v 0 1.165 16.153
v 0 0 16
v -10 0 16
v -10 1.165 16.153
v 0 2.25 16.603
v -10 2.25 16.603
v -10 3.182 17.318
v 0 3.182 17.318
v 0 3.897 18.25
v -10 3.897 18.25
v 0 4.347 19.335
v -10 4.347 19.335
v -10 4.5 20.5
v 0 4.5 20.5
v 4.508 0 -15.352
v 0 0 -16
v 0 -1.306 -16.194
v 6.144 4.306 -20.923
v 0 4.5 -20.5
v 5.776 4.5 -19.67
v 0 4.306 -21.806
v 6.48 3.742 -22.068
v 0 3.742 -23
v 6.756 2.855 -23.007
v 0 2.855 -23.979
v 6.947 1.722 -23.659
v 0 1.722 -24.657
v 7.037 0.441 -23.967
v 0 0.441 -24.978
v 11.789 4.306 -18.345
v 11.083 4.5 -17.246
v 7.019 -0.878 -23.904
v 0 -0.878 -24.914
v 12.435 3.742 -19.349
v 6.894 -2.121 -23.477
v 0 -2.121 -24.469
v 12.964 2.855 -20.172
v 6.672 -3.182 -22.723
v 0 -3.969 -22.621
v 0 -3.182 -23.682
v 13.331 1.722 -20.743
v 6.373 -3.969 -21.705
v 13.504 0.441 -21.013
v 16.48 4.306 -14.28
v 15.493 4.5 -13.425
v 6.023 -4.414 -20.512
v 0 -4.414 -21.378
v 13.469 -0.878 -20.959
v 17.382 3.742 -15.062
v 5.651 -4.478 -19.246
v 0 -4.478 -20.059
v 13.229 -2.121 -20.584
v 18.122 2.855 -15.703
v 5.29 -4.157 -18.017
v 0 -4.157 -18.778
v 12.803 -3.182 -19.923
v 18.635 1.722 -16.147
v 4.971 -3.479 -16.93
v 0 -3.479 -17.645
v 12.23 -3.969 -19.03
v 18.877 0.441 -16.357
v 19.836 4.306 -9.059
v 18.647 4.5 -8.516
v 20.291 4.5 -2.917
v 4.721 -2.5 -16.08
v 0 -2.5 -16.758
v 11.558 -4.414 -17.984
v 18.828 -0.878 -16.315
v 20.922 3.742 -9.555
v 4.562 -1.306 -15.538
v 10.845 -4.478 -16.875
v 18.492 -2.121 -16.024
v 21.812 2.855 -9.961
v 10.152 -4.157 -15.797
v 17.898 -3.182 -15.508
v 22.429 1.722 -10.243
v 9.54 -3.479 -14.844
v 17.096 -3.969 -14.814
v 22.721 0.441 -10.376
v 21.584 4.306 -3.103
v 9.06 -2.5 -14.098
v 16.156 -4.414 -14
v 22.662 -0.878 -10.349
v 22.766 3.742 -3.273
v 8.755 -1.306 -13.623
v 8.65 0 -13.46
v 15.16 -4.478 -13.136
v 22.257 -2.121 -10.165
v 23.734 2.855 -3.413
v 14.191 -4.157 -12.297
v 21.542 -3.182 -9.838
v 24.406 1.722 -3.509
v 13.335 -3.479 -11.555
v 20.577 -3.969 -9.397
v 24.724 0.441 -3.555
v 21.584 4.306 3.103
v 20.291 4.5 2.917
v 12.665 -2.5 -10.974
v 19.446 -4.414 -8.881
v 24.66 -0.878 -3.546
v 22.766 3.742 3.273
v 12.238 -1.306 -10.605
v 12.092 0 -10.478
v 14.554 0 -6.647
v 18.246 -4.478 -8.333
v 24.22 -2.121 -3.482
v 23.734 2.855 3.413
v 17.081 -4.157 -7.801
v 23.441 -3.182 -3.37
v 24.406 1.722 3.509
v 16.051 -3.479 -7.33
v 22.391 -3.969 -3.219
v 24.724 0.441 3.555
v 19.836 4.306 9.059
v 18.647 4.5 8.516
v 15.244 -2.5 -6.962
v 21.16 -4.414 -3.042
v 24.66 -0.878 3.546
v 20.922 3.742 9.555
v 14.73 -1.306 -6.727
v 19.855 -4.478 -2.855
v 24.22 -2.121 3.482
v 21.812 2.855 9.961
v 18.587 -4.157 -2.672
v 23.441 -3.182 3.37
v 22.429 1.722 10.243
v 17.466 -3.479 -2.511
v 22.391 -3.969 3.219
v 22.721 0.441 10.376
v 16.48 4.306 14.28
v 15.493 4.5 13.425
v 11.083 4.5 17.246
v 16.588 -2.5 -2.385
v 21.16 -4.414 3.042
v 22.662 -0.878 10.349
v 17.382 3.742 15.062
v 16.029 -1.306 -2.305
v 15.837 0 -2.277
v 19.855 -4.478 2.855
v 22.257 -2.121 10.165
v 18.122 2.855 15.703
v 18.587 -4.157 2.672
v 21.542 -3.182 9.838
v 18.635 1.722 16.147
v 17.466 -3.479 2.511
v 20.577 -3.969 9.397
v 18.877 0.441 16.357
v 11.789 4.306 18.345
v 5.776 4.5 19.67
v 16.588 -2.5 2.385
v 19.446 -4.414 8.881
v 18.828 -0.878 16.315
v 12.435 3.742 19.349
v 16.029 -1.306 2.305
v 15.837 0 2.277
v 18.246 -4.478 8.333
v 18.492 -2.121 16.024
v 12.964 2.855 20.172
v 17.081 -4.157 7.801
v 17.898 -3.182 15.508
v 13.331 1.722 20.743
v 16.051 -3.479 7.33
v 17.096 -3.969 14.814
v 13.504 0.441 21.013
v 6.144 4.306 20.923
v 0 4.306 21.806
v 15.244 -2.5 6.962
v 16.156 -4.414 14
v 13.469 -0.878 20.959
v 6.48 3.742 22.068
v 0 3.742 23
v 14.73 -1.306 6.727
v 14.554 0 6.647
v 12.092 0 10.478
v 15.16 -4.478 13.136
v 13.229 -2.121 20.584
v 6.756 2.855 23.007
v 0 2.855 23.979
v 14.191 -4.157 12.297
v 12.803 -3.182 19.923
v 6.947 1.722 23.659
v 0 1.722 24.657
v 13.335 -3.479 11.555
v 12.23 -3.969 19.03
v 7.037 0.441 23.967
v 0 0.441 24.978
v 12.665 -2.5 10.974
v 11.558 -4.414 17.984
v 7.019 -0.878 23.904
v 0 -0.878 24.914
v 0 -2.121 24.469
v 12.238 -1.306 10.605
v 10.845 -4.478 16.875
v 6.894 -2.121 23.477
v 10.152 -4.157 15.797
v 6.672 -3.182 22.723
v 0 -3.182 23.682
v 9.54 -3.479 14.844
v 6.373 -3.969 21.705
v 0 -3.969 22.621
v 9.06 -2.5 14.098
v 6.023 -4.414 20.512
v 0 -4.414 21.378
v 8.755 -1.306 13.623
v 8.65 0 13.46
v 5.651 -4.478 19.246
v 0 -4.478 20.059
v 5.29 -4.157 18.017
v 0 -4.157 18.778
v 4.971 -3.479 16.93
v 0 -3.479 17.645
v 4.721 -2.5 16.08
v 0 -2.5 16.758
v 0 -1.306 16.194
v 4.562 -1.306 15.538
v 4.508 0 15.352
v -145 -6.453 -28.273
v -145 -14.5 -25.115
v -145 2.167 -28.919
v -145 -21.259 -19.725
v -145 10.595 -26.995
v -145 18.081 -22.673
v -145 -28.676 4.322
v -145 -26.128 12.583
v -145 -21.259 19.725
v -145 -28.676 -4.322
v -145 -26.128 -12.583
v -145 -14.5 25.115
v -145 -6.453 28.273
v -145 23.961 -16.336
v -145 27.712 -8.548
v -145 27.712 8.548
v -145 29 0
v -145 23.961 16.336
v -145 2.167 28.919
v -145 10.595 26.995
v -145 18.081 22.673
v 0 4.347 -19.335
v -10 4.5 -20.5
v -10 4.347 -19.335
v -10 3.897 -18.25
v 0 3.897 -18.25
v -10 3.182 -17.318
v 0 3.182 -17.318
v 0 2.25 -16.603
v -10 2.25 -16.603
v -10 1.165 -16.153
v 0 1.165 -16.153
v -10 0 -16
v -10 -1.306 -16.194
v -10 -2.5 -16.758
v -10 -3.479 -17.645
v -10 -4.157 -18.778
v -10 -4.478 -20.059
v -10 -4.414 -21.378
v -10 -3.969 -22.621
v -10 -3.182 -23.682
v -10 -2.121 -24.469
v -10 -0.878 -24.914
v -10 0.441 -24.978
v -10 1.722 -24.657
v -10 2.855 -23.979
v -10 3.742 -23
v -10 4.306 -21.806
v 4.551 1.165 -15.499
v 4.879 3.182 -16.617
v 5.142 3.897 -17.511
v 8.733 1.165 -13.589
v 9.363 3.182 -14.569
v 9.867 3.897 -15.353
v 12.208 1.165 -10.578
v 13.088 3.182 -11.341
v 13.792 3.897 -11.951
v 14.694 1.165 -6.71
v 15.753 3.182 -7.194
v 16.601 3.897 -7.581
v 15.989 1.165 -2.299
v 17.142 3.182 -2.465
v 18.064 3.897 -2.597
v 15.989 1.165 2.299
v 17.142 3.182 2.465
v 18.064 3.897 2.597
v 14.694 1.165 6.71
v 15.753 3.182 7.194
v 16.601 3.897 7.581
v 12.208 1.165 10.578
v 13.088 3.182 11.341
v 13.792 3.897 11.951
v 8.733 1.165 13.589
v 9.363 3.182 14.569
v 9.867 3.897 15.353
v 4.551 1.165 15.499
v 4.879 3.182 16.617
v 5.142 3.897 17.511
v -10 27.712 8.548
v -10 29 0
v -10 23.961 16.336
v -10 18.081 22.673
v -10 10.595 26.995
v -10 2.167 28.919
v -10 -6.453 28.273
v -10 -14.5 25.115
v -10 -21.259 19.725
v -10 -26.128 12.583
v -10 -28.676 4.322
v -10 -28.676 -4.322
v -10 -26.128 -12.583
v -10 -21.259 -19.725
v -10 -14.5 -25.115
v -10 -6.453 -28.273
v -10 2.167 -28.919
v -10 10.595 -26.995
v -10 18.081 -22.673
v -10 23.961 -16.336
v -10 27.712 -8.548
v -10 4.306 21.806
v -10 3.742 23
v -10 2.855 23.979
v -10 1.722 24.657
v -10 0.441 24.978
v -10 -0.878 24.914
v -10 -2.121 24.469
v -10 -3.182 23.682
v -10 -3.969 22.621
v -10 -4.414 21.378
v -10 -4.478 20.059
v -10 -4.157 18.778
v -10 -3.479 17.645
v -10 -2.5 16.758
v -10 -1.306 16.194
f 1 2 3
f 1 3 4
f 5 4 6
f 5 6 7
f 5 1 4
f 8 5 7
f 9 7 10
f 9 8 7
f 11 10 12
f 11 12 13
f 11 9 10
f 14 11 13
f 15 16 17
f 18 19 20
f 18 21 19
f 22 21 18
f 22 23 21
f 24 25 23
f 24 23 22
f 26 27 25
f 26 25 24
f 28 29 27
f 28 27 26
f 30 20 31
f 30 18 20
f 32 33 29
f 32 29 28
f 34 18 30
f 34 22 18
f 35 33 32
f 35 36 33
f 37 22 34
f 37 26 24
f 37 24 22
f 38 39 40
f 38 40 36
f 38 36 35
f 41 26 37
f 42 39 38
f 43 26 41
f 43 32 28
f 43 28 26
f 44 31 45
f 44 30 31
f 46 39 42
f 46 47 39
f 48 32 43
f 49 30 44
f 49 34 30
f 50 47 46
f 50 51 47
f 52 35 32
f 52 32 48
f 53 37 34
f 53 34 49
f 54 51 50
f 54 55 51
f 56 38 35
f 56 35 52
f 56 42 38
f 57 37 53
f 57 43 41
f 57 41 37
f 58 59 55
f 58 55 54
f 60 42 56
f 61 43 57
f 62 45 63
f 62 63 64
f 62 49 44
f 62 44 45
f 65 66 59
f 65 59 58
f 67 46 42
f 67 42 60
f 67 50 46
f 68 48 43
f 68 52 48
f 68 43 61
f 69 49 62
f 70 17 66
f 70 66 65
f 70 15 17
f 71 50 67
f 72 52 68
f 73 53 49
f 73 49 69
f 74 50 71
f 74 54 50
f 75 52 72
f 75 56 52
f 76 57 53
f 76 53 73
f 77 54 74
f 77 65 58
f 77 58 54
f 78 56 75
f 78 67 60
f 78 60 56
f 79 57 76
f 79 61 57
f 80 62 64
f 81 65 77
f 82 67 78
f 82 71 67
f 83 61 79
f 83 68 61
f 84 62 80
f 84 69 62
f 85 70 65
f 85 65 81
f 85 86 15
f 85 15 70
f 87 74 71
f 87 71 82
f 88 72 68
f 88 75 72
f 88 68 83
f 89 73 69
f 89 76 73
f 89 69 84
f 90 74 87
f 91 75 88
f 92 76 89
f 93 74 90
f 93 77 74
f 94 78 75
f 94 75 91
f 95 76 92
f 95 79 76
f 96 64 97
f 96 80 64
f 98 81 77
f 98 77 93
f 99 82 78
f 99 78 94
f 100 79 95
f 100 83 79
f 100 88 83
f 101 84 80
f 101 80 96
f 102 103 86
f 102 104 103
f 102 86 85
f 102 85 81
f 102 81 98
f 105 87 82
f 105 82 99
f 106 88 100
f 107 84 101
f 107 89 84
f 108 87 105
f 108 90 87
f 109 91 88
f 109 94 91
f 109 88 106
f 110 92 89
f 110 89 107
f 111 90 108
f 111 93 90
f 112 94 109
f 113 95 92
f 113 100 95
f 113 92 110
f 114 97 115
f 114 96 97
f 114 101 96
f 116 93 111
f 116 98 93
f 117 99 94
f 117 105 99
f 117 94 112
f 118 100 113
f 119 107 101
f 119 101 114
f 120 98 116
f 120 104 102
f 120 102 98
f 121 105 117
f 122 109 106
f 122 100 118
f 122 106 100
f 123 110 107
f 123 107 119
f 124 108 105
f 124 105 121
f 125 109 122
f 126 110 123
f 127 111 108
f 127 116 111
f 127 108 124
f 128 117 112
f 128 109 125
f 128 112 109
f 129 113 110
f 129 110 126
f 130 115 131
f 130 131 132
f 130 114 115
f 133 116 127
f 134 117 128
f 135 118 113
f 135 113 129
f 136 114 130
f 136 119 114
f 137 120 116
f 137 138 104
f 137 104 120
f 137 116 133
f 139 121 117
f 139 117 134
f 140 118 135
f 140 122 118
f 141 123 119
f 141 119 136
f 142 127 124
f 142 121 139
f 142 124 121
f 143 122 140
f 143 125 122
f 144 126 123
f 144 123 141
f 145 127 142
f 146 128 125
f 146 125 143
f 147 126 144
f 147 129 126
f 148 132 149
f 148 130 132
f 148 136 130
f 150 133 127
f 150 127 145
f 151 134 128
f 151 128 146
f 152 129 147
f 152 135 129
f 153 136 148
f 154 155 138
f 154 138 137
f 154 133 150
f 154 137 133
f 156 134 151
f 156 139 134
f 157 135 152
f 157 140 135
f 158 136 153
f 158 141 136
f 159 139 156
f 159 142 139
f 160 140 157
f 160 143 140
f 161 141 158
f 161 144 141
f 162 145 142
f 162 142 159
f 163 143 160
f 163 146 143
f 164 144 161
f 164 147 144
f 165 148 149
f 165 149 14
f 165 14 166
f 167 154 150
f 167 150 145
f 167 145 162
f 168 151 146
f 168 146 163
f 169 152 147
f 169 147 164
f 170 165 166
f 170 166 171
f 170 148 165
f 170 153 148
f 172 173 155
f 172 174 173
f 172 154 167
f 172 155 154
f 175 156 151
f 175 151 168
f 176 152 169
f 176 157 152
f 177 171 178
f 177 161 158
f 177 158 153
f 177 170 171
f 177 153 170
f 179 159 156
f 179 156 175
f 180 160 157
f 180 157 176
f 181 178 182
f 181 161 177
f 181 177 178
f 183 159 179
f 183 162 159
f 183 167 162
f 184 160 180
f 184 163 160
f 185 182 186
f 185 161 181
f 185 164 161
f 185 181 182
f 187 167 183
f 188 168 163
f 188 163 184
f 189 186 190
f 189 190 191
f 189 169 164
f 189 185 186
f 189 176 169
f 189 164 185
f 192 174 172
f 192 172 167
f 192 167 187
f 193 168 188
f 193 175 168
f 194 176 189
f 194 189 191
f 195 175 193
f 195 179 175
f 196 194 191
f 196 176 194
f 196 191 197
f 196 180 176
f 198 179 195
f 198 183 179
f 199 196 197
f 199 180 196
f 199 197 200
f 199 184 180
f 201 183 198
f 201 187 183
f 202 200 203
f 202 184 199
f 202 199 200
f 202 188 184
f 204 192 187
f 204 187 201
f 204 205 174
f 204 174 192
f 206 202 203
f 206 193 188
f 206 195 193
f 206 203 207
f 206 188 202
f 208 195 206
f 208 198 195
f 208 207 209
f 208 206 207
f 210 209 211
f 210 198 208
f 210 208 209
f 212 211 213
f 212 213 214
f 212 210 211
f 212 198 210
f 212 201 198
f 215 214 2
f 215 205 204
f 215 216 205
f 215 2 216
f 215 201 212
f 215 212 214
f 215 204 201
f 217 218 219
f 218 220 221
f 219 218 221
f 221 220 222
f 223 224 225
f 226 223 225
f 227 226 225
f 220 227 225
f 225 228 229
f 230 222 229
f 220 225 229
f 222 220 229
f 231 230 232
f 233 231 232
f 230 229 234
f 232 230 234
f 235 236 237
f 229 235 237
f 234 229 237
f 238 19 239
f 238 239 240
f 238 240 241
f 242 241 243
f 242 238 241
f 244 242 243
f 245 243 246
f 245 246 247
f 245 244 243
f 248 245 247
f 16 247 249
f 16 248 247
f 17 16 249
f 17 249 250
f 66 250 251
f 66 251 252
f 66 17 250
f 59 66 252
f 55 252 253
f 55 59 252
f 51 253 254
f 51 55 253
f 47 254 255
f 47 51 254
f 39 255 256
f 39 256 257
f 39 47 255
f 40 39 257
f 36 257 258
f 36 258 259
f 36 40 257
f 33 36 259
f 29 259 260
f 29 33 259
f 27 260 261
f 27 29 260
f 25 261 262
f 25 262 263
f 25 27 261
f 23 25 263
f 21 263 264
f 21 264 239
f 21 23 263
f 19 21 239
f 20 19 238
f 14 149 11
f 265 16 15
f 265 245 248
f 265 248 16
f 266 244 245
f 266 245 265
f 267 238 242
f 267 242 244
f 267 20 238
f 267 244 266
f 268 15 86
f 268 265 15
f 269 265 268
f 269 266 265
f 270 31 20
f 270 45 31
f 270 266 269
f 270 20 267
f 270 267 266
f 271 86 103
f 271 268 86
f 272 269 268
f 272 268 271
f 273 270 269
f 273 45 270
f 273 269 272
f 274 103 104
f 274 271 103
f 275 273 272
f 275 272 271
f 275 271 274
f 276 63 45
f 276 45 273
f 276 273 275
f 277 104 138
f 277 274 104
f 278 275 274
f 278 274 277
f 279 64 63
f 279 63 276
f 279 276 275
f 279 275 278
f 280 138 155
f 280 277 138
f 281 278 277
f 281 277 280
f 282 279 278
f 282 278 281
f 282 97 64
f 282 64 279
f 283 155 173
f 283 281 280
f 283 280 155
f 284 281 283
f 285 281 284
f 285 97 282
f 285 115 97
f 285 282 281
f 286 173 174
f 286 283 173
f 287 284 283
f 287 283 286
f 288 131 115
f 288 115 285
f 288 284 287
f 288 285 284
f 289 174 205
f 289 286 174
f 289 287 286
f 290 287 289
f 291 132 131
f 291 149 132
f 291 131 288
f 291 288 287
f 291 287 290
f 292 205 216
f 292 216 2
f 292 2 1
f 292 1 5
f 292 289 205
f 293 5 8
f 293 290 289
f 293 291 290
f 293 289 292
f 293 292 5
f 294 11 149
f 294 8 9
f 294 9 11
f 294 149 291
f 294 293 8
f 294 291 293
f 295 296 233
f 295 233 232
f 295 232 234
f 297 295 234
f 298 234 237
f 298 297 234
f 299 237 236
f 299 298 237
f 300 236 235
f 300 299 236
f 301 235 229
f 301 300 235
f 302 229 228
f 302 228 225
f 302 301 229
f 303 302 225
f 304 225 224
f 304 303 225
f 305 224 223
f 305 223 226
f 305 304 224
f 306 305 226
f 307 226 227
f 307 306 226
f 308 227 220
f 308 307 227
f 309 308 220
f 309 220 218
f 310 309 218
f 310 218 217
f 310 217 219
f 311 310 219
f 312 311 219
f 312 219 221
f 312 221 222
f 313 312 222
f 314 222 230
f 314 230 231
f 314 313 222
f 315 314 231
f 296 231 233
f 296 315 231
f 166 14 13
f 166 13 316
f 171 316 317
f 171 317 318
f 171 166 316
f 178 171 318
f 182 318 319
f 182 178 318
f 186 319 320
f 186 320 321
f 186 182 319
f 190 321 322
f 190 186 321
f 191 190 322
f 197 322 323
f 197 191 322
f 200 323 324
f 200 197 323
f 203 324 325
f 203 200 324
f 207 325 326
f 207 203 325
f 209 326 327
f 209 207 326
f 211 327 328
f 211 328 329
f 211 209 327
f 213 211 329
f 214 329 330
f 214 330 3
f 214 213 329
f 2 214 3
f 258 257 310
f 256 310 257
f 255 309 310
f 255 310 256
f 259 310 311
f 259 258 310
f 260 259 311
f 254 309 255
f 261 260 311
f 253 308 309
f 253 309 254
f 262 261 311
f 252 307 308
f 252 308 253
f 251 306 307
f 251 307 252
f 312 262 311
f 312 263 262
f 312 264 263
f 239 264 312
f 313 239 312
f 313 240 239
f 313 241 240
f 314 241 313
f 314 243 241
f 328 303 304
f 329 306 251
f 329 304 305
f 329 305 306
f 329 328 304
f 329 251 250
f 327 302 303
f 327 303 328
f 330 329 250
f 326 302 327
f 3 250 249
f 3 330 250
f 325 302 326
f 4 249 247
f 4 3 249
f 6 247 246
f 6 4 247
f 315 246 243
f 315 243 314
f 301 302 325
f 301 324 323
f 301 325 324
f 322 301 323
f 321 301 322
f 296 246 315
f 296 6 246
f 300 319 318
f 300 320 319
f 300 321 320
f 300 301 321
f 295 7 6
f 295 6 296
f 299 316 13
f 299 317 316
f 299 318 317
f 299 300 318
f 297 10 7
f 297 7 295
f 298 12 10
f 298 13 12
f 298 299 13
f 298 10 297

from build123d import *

# Parameters (mm, degrees)
F0_R     = 29
F1_DEPTH = 135
F4_DEPTH = 10
F5_DEPTH = 10


with BuildPart() as f1:
    # F0 (on Right) → F1 (new body)
    with BuildSketch(Plane.YZ):
        Circle(F0_R)
    extrude(amount=-F1_DEPTH)

    # F2 (on Right) → F3 (revolve)
    with BuildSketch(Plane.YZ):
        with BuildLine():
            ThreePointArc((0, 16), (3.1819805153, 17.3180194847), (4.5, 20.5))
            ThreePointArc((4.5, 20.5), (-3.1819805153, 23.6819805153), (0, 16))
        make_face()
    revolve(axis=Axis((0, -100, 0), (0, -1, 0)))

    # F4 (add): a face of the model
    f4_faces = [f1.faces().sort_by_distance(p)[0] for p in [
        (-135, 0, 0),
    ]]
    extrude(f4_faces, amount=F4_DEPTH)

    # F5 (cut): a face of the model
    f5_faces = [f1.faces().sort_by_distance(p)[0] for p in [
        (0, 0, 0),
    ]]
    extrude(f5_faces, amount=-F5_DEPTH, mode=Mode.SUBTRACT)


solid = f1.part
